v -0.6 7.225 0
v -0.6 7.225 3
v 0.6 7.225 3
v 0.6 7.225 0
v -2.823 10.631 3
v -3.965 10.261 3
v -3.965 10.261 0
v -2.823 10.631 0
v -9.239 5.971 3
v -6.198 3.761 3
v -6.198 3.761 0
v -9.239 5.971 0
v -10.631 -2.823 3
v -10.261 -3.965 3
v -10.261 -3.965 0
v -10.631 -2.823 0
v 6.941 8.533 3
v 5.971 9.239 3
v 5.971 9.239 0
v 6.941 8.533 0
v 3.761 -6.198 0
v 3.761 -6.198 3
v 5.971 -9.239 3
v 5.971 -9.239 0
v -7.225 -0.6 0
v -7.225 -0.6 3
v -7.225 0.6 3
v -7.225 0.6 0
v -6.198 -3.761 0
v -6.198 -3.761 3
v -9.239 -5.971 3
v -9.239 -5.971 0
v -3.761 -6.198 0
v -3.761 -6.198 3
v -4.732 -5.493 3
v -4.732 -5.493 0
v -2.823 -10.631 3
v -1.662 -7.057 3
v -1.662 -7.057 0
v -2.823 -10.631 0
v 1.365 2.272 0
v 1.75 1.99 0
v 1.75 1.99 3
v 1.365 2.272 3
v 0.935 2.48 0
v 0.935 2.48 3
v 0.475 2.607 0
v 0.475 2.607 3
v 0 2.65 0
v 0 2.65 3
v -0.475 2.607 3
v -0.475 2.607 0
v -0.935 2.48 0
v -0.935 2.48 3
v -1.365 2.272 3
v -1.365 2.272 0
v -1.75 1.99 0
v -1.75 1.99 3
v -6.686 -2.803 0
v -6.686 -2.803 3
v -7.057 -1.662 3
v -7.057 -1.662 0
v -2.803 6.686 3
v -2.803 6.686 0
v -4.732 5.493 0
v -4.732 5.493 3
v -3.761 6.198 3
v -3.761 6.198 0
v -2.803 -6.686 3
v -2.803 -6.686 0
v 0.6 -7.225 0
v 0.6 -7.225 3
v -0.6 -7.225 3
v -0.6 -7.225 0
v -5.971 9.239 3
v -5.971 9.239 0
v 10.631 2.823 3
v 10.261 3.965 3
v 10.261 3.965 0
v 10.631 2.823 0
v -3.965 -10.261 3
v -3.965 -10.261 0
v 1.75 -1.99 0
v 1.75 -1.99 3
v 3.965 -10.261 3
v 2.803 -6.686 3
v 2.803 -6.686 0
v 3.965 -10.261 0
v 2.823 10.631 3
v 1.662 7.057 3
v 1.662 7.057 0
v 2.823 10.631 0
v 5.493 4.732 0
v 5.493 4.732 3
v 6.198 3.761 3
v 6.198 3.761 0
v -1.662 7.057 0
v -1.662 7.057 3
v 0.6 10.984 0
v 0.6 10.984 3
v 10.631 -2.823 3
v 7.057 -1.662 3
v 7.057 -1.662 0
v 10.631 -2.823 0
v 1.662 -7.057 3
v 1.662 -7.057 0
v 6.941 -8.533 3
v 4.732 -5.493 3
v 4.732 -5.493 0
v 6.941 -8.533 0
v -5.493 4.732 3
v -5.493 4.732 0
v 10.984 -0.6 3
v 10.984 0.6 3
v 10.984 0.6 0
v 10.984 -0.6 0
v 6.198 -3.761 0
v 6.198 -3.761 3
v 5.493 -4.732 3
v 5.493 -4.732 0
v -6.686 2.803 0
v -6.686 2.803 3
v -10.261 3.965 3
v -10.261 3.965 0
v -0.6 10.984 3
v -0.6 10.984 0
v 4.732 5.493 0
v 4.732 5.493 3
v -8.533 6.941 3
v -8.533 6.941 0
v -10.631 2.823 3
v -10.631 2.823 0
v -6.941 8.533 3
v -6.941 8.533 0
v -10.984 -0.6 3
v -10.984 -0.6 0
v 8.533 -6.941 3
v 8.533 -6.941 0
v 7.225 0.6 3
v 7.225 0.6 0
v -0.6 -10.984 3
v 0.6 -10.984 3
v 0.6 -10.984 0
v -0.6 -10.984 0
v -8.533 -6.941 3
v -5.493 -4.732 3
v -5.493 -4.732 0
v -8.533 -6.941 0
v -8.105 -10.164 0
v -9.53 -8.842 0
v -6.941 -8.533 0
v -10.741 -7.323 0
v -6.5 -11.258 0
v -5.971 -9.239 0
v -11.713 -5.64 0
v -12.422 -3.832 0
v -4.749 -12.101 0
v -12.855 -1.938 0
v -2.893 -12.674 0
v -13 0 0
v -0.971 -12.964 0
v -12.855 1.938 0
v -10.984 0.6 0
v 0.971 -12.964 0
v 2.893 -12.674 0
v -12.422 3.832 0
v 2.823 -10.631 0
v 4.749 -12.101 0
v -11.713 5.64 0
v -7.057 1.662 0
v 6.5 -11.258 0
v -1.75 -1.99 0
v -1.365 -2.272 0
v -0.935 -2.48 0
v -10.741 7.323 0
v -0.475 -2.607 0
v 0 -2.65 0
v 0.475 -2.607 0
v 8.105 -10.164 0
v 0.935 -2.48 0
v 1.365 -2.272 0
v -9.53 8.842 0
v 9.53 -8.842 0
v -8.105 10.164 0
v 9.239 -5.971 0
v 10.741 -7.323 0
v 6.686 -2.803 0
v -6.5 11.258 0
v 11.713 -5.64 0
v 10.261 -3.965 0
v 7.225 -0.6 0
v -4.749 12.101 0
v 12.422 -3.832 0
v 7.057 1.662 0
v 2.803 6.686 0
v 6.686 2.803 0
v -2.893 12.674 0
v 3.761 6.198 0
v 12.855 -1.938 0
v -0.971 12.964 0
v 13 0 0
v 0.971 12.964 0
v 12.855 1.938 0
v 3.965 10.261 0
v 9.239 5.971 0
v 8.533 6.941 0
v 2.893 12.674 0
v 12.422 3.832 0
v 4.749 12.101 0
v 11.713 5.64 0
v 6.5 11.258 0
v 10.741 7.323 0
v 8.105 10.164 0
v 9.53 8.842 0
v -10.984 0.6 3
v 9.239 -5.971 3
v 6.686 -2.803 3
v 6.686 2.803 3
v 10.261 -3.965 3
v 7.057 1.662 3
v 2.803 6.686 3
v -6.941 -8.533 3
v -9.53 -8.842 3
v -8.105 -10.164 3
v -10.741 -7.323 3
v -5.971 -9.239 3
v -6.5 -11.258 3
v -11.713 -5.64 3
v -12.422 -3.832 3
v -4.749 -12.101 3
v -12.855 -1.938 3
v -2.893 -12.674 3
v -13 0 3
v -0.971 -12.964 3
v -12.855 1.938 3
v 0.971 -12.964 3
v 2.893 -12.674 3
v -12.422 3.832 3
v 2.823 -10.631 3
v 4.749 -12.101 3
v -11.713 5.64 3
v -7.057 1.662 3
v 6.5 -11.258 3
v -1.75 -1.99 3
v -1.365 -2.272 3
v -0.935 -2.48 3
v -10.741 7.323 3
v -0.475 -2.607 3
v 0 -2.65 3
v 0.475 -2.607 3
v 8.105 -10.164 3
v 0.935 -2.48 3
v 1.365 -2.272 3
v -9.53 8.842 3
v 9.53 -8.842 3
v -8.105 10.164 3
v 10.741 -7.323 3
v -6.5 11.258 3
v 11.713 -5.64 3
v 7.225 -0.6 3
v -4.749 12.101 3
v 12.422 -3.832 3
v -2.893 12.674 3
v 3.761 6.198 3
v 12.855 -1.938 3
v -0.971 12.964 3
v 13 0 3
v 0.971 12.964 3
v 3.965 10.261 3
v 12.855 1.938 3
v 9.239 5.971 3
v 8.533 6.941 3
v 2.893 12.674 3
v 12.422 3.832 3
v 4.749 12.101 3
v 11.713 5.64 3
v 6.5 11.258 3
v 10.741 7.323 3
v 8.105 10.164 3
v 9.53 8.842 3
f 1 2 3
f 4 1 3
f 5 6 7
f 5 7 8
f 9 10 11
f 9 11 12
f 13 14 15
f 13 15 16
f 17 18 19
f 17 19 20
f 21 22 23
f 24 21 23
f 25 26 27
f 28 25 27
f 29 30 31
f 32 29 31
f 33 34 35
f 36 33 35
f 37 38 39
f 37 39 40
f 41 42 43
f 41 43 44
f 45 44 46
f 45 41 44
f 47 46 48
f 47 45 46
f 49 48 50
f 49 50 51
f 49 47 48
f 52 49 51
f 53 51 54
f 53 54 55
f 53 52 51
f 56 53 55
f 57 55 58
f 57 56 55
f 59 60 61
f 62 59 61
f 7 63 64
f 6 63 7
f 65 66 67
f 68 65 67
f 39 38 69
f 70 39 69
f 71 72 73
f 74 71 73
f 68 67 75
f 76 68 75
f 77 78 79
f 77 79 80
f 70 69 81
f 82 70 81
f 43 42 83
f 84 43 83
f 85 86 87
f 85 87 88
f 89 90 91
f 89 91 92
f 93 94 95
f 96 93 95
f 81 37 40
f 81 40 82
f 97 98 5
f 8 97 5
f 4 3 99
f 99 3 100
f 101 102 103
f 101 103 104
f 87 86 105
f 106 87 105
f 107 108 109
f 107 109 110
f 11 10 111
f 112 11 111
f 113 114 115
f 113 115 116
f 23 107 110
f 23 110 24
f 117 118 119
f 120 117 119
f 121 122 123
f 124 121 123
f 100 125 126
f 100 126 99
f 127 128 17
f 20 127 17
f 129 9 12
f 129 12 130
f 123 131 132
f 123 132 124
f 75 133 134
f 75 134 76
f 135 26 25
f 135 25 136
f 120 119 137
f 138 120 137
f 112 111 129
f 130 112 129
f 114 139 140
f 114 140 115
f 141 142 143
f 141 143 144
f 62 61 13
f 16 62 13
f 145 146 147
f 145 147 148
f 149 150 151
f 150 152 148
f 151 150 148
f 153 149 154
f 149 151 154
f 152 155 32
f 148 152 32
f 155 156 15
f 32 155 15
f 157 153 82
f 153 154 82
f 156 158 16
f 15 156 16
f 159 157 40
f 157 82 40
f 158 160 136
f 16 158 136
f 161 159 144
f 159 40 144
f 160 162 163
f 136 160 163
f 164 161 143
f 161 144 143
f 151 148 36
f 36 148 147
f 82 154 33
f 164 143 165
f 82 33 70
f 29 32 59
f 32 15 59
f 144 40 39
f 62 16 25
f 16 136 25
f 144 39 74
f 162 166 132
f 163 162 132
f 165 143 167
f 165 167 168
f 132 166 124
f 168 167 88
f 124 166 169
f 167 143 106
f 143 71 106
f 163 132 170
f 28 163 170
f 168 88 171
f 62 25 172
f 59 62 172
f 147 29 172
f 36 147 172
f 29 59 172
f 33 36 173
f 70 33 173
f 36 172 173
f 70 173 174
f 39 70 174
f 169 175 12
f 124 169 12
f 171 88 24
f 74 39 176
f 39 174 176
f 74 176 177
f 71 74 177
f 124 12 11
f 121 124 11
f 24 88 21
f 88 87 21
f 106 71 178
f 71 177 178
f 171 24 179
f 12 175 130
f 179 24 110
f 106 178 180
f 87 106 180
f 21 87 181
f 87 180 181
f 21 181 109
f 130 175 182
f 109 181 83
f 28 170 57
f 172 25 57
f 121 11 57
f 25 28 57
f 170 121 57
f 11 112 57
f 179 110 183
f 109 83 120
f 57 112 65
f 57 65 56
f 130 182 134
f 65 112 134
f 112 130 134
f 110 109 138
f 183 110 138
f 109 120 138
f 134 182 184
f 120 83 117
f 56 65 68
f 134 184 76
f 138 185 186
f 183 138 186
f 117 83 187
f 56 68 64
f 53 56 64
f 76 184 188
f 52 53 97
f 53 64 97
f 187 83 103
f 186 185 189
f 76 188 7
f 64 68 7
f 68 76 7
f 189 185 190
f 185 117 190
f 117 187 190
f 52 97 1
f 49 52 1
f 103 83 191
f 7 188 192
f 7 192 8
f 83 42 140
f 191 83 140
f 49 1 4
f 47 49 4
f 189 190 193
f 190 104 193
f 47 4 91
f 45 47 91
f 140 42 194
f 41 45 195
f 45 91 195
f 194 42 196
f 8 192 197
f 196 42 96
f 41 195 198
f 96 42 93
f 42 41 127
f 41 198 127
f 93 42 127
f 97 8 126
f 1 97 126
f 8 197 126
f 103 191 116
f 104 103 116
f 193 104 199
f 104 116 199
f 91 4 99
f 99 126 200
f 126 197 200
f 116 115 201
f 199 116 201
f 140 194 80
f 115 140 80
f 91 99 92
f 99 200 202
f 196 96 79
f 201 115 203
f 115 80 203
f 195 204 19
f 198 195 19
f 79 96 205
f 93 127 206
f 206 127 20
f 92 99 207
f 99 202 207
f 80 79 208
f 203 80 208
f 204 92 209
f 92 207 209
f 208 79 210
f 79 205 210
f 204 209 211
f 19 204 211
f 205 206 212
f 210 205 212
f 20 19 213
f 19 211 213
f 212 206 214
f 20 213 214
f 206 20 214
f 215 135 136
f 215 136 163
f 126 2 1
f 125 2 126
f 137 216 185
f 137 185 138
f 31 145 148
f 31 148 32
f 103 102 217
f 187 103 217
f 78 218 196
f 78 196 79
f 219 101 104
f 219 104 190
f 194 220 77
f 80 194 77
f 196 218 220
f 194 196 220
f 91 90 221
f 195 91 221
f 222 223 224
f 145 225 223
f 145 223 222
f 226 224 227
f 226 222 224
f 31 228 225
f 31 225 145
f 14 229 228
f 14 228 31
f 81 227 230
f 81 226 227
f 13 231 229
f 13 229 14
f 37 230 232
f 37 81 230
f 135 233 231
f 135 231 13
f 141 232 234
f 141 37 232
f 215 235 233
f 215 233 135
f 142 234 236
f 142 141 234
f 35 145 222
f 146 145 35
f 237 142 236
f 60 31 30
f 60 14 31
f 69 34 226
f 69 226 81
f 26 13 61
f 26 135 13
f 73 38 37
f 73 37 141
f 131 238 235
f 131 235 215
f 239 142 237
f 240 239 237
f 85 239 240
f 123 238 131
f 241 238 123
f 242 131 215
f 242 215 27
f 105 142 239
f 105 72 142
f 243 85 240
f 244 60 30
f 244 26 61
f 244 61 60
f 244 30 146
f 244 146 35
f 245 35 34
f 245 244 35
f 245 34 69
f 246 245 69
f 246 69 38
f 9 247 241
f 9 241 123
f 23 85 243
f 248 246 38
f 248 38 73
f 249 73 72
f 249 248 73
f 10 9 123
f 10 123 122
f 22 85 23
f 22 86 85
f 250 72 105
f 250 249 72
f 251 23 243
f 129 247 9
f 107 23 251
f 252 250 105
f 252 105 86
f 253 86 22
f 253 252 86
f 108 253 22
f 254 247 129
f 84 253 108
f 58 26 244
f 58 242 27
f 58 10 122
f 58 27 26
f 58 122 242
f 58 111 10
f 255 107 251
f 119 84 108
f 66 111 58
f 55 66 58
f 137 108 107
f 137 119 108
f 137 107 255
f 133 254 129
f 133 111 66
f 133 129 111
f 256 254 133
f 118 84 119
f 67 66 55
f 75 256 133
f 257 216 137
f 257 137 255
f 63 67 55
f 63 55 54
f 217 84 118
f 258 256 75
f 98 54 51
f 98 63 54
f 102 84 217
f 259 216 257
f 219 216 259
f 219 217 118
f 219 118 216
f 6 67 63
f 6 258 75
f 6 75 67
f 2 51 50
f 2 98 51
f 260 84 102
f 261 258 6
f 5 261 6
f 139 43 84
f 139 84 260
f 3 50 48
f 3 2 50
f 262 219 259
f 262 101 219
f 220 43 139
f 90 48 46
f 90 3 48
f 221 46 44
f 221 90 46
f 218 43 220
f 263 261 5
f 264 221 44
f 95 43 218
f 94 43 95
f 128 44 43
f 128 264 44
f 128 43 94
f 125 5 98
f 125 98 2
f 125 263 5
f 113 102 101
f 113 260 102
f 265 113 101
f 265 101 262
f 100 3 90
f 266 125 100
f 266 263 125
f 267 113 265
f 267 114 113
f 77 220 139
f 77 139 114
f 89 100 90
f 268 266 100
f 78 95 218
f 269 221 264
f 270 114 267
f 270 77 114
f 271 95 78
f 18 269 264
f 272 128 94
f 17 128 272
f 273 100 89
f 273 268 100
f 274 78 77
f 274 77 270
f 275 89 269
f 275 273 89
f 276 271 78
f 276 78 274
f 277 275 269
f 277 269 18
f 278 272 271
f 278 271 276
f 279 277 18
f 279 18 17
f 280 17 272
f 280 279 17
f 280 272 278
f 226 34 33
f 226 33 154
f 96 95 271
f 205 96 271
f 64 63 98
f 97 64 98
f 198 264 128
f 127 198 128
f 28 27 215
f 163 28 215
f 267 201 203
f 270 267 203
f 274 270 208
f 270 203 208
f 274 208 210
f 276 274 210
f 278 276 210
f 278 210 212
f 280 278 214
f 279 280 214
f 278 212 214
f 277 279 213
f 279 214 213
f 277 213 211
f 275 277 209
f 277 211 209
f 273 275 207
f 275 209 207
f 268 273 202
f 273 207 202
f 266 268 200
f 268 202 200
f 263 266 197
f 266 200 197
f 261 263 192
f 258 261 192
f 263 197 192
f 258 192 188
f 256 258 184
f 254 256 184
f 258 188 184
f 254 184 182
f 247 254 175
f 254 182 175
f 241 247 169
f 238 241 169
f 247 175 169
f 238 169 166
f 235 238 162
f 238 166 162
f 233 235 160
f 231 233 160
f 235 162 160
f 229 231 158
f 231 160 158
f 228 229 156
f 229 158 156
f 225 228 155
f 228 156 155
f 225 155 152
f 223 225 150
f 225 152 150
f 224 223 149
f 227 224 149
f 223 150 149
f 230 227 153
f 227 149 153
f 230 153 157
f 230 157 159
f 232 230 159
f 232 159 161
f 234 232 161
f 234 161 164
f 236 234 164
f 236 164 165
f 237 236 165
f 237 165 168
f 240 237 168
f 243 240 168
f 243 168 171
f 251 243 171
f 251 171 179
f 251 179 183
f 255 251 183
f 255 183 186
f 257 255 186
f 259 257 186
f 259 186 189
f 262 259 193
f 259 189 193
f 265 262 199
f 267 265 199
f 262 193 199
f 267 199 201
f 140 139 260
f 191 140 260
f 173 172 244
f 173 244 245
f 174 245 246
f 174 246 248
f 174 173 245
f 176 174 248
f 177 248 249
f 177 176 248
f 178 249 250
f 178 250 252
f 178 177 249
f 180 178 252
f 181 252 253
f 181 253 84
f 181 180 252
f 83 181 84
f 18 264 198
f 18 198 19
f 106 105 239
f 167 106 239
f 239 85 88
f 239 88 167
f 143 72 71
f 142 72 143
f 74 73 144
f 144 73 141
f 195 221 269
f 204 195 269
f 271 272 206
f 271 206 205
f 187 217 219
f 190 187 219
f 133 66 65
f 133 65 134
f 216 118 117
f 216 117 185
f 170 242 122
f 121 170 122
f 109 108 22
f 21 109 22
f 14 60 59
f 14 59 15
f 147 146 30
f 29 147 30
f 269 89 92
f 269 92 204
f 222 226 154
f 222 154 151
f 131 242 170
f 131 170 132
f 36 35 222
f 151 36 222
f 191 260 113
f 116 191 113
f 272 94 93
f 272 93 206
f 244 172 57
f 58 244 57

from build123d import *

# Parameters (mm, degrees)
SKETCH1_R           = 13
SKETCH1_R_2         = 2.65
BOSS_EXTRUDE1_DEPTH = 3
SKETCH2_W           = 1.2
SKETCH2_H           = 3.758494417
CUT_EXTRUDE1_DEPTH  = 19.62793601
CIRPATTERN1_COUNT   = 20


with BuildPart() as part:
    # Sketch1 → Boss-Extrude1 (new body)
    # profile 1 of 3: a face of its own
    with BuildSketch(Plane.XY):
        Circle(SKETCH1_R)
        Circle(SKETCH1_R_2, mode=Mode.SUBTRACT)
    # profile 2 of 3: a face of its own
    with BuildSketch(Plane.XY):
        with BuildLine():
            Line((-1.75, -1.989974874), (-1.75, 1.989974874))
            ThreePointArc((-1.75, 1.989974874), (-2.65, 0), (-1.75, -1.989974874))
        make_face()
    # profile 3 of 3: a face of its own
    with BuildSketch(Plane.XY):
        with BuildLine():
            ThreePointArc((2.65, 0), (2.414539294, 1.092016483), (1.75, 1.989974874))
            Line((1.75, 1.989974874), (1.75, -1.989974874))
            ThreePointArc((1.75, -1.989974874), (2.414539294, -1.092016483), (2.65, 0))
        make_face()
    extrude(amount=BOSS_EXTRUDE1_DEPTH)

    # Sketch2 → Cut-Extrude1 (cut, through all)
    with BuildSketch(Plane.XY.offset(3)):
        with Locations((0, 9.104376966)):
            Rectangle(SKETCH2_W, SKETCH2_H)
    cut_extrude1 = extrude(amount=-CUT_EXTRUDE1_DEPTH, mode=Mode.SUBTRACT)

    # CirPattern1: Cut-Extrude1 ×20 about axis
    cirpattern1_axis = Axis((0, 0, 0), (0, 0, 1))
    for i in range(1, CIRPATTERN1_COUNT):
        add(cut_extrude1.rotate(cirpattern1_axis, i * 360 / CIRPATTERN1_COUNT), mode=Mode.SUBTRACT)


solid = part.part
